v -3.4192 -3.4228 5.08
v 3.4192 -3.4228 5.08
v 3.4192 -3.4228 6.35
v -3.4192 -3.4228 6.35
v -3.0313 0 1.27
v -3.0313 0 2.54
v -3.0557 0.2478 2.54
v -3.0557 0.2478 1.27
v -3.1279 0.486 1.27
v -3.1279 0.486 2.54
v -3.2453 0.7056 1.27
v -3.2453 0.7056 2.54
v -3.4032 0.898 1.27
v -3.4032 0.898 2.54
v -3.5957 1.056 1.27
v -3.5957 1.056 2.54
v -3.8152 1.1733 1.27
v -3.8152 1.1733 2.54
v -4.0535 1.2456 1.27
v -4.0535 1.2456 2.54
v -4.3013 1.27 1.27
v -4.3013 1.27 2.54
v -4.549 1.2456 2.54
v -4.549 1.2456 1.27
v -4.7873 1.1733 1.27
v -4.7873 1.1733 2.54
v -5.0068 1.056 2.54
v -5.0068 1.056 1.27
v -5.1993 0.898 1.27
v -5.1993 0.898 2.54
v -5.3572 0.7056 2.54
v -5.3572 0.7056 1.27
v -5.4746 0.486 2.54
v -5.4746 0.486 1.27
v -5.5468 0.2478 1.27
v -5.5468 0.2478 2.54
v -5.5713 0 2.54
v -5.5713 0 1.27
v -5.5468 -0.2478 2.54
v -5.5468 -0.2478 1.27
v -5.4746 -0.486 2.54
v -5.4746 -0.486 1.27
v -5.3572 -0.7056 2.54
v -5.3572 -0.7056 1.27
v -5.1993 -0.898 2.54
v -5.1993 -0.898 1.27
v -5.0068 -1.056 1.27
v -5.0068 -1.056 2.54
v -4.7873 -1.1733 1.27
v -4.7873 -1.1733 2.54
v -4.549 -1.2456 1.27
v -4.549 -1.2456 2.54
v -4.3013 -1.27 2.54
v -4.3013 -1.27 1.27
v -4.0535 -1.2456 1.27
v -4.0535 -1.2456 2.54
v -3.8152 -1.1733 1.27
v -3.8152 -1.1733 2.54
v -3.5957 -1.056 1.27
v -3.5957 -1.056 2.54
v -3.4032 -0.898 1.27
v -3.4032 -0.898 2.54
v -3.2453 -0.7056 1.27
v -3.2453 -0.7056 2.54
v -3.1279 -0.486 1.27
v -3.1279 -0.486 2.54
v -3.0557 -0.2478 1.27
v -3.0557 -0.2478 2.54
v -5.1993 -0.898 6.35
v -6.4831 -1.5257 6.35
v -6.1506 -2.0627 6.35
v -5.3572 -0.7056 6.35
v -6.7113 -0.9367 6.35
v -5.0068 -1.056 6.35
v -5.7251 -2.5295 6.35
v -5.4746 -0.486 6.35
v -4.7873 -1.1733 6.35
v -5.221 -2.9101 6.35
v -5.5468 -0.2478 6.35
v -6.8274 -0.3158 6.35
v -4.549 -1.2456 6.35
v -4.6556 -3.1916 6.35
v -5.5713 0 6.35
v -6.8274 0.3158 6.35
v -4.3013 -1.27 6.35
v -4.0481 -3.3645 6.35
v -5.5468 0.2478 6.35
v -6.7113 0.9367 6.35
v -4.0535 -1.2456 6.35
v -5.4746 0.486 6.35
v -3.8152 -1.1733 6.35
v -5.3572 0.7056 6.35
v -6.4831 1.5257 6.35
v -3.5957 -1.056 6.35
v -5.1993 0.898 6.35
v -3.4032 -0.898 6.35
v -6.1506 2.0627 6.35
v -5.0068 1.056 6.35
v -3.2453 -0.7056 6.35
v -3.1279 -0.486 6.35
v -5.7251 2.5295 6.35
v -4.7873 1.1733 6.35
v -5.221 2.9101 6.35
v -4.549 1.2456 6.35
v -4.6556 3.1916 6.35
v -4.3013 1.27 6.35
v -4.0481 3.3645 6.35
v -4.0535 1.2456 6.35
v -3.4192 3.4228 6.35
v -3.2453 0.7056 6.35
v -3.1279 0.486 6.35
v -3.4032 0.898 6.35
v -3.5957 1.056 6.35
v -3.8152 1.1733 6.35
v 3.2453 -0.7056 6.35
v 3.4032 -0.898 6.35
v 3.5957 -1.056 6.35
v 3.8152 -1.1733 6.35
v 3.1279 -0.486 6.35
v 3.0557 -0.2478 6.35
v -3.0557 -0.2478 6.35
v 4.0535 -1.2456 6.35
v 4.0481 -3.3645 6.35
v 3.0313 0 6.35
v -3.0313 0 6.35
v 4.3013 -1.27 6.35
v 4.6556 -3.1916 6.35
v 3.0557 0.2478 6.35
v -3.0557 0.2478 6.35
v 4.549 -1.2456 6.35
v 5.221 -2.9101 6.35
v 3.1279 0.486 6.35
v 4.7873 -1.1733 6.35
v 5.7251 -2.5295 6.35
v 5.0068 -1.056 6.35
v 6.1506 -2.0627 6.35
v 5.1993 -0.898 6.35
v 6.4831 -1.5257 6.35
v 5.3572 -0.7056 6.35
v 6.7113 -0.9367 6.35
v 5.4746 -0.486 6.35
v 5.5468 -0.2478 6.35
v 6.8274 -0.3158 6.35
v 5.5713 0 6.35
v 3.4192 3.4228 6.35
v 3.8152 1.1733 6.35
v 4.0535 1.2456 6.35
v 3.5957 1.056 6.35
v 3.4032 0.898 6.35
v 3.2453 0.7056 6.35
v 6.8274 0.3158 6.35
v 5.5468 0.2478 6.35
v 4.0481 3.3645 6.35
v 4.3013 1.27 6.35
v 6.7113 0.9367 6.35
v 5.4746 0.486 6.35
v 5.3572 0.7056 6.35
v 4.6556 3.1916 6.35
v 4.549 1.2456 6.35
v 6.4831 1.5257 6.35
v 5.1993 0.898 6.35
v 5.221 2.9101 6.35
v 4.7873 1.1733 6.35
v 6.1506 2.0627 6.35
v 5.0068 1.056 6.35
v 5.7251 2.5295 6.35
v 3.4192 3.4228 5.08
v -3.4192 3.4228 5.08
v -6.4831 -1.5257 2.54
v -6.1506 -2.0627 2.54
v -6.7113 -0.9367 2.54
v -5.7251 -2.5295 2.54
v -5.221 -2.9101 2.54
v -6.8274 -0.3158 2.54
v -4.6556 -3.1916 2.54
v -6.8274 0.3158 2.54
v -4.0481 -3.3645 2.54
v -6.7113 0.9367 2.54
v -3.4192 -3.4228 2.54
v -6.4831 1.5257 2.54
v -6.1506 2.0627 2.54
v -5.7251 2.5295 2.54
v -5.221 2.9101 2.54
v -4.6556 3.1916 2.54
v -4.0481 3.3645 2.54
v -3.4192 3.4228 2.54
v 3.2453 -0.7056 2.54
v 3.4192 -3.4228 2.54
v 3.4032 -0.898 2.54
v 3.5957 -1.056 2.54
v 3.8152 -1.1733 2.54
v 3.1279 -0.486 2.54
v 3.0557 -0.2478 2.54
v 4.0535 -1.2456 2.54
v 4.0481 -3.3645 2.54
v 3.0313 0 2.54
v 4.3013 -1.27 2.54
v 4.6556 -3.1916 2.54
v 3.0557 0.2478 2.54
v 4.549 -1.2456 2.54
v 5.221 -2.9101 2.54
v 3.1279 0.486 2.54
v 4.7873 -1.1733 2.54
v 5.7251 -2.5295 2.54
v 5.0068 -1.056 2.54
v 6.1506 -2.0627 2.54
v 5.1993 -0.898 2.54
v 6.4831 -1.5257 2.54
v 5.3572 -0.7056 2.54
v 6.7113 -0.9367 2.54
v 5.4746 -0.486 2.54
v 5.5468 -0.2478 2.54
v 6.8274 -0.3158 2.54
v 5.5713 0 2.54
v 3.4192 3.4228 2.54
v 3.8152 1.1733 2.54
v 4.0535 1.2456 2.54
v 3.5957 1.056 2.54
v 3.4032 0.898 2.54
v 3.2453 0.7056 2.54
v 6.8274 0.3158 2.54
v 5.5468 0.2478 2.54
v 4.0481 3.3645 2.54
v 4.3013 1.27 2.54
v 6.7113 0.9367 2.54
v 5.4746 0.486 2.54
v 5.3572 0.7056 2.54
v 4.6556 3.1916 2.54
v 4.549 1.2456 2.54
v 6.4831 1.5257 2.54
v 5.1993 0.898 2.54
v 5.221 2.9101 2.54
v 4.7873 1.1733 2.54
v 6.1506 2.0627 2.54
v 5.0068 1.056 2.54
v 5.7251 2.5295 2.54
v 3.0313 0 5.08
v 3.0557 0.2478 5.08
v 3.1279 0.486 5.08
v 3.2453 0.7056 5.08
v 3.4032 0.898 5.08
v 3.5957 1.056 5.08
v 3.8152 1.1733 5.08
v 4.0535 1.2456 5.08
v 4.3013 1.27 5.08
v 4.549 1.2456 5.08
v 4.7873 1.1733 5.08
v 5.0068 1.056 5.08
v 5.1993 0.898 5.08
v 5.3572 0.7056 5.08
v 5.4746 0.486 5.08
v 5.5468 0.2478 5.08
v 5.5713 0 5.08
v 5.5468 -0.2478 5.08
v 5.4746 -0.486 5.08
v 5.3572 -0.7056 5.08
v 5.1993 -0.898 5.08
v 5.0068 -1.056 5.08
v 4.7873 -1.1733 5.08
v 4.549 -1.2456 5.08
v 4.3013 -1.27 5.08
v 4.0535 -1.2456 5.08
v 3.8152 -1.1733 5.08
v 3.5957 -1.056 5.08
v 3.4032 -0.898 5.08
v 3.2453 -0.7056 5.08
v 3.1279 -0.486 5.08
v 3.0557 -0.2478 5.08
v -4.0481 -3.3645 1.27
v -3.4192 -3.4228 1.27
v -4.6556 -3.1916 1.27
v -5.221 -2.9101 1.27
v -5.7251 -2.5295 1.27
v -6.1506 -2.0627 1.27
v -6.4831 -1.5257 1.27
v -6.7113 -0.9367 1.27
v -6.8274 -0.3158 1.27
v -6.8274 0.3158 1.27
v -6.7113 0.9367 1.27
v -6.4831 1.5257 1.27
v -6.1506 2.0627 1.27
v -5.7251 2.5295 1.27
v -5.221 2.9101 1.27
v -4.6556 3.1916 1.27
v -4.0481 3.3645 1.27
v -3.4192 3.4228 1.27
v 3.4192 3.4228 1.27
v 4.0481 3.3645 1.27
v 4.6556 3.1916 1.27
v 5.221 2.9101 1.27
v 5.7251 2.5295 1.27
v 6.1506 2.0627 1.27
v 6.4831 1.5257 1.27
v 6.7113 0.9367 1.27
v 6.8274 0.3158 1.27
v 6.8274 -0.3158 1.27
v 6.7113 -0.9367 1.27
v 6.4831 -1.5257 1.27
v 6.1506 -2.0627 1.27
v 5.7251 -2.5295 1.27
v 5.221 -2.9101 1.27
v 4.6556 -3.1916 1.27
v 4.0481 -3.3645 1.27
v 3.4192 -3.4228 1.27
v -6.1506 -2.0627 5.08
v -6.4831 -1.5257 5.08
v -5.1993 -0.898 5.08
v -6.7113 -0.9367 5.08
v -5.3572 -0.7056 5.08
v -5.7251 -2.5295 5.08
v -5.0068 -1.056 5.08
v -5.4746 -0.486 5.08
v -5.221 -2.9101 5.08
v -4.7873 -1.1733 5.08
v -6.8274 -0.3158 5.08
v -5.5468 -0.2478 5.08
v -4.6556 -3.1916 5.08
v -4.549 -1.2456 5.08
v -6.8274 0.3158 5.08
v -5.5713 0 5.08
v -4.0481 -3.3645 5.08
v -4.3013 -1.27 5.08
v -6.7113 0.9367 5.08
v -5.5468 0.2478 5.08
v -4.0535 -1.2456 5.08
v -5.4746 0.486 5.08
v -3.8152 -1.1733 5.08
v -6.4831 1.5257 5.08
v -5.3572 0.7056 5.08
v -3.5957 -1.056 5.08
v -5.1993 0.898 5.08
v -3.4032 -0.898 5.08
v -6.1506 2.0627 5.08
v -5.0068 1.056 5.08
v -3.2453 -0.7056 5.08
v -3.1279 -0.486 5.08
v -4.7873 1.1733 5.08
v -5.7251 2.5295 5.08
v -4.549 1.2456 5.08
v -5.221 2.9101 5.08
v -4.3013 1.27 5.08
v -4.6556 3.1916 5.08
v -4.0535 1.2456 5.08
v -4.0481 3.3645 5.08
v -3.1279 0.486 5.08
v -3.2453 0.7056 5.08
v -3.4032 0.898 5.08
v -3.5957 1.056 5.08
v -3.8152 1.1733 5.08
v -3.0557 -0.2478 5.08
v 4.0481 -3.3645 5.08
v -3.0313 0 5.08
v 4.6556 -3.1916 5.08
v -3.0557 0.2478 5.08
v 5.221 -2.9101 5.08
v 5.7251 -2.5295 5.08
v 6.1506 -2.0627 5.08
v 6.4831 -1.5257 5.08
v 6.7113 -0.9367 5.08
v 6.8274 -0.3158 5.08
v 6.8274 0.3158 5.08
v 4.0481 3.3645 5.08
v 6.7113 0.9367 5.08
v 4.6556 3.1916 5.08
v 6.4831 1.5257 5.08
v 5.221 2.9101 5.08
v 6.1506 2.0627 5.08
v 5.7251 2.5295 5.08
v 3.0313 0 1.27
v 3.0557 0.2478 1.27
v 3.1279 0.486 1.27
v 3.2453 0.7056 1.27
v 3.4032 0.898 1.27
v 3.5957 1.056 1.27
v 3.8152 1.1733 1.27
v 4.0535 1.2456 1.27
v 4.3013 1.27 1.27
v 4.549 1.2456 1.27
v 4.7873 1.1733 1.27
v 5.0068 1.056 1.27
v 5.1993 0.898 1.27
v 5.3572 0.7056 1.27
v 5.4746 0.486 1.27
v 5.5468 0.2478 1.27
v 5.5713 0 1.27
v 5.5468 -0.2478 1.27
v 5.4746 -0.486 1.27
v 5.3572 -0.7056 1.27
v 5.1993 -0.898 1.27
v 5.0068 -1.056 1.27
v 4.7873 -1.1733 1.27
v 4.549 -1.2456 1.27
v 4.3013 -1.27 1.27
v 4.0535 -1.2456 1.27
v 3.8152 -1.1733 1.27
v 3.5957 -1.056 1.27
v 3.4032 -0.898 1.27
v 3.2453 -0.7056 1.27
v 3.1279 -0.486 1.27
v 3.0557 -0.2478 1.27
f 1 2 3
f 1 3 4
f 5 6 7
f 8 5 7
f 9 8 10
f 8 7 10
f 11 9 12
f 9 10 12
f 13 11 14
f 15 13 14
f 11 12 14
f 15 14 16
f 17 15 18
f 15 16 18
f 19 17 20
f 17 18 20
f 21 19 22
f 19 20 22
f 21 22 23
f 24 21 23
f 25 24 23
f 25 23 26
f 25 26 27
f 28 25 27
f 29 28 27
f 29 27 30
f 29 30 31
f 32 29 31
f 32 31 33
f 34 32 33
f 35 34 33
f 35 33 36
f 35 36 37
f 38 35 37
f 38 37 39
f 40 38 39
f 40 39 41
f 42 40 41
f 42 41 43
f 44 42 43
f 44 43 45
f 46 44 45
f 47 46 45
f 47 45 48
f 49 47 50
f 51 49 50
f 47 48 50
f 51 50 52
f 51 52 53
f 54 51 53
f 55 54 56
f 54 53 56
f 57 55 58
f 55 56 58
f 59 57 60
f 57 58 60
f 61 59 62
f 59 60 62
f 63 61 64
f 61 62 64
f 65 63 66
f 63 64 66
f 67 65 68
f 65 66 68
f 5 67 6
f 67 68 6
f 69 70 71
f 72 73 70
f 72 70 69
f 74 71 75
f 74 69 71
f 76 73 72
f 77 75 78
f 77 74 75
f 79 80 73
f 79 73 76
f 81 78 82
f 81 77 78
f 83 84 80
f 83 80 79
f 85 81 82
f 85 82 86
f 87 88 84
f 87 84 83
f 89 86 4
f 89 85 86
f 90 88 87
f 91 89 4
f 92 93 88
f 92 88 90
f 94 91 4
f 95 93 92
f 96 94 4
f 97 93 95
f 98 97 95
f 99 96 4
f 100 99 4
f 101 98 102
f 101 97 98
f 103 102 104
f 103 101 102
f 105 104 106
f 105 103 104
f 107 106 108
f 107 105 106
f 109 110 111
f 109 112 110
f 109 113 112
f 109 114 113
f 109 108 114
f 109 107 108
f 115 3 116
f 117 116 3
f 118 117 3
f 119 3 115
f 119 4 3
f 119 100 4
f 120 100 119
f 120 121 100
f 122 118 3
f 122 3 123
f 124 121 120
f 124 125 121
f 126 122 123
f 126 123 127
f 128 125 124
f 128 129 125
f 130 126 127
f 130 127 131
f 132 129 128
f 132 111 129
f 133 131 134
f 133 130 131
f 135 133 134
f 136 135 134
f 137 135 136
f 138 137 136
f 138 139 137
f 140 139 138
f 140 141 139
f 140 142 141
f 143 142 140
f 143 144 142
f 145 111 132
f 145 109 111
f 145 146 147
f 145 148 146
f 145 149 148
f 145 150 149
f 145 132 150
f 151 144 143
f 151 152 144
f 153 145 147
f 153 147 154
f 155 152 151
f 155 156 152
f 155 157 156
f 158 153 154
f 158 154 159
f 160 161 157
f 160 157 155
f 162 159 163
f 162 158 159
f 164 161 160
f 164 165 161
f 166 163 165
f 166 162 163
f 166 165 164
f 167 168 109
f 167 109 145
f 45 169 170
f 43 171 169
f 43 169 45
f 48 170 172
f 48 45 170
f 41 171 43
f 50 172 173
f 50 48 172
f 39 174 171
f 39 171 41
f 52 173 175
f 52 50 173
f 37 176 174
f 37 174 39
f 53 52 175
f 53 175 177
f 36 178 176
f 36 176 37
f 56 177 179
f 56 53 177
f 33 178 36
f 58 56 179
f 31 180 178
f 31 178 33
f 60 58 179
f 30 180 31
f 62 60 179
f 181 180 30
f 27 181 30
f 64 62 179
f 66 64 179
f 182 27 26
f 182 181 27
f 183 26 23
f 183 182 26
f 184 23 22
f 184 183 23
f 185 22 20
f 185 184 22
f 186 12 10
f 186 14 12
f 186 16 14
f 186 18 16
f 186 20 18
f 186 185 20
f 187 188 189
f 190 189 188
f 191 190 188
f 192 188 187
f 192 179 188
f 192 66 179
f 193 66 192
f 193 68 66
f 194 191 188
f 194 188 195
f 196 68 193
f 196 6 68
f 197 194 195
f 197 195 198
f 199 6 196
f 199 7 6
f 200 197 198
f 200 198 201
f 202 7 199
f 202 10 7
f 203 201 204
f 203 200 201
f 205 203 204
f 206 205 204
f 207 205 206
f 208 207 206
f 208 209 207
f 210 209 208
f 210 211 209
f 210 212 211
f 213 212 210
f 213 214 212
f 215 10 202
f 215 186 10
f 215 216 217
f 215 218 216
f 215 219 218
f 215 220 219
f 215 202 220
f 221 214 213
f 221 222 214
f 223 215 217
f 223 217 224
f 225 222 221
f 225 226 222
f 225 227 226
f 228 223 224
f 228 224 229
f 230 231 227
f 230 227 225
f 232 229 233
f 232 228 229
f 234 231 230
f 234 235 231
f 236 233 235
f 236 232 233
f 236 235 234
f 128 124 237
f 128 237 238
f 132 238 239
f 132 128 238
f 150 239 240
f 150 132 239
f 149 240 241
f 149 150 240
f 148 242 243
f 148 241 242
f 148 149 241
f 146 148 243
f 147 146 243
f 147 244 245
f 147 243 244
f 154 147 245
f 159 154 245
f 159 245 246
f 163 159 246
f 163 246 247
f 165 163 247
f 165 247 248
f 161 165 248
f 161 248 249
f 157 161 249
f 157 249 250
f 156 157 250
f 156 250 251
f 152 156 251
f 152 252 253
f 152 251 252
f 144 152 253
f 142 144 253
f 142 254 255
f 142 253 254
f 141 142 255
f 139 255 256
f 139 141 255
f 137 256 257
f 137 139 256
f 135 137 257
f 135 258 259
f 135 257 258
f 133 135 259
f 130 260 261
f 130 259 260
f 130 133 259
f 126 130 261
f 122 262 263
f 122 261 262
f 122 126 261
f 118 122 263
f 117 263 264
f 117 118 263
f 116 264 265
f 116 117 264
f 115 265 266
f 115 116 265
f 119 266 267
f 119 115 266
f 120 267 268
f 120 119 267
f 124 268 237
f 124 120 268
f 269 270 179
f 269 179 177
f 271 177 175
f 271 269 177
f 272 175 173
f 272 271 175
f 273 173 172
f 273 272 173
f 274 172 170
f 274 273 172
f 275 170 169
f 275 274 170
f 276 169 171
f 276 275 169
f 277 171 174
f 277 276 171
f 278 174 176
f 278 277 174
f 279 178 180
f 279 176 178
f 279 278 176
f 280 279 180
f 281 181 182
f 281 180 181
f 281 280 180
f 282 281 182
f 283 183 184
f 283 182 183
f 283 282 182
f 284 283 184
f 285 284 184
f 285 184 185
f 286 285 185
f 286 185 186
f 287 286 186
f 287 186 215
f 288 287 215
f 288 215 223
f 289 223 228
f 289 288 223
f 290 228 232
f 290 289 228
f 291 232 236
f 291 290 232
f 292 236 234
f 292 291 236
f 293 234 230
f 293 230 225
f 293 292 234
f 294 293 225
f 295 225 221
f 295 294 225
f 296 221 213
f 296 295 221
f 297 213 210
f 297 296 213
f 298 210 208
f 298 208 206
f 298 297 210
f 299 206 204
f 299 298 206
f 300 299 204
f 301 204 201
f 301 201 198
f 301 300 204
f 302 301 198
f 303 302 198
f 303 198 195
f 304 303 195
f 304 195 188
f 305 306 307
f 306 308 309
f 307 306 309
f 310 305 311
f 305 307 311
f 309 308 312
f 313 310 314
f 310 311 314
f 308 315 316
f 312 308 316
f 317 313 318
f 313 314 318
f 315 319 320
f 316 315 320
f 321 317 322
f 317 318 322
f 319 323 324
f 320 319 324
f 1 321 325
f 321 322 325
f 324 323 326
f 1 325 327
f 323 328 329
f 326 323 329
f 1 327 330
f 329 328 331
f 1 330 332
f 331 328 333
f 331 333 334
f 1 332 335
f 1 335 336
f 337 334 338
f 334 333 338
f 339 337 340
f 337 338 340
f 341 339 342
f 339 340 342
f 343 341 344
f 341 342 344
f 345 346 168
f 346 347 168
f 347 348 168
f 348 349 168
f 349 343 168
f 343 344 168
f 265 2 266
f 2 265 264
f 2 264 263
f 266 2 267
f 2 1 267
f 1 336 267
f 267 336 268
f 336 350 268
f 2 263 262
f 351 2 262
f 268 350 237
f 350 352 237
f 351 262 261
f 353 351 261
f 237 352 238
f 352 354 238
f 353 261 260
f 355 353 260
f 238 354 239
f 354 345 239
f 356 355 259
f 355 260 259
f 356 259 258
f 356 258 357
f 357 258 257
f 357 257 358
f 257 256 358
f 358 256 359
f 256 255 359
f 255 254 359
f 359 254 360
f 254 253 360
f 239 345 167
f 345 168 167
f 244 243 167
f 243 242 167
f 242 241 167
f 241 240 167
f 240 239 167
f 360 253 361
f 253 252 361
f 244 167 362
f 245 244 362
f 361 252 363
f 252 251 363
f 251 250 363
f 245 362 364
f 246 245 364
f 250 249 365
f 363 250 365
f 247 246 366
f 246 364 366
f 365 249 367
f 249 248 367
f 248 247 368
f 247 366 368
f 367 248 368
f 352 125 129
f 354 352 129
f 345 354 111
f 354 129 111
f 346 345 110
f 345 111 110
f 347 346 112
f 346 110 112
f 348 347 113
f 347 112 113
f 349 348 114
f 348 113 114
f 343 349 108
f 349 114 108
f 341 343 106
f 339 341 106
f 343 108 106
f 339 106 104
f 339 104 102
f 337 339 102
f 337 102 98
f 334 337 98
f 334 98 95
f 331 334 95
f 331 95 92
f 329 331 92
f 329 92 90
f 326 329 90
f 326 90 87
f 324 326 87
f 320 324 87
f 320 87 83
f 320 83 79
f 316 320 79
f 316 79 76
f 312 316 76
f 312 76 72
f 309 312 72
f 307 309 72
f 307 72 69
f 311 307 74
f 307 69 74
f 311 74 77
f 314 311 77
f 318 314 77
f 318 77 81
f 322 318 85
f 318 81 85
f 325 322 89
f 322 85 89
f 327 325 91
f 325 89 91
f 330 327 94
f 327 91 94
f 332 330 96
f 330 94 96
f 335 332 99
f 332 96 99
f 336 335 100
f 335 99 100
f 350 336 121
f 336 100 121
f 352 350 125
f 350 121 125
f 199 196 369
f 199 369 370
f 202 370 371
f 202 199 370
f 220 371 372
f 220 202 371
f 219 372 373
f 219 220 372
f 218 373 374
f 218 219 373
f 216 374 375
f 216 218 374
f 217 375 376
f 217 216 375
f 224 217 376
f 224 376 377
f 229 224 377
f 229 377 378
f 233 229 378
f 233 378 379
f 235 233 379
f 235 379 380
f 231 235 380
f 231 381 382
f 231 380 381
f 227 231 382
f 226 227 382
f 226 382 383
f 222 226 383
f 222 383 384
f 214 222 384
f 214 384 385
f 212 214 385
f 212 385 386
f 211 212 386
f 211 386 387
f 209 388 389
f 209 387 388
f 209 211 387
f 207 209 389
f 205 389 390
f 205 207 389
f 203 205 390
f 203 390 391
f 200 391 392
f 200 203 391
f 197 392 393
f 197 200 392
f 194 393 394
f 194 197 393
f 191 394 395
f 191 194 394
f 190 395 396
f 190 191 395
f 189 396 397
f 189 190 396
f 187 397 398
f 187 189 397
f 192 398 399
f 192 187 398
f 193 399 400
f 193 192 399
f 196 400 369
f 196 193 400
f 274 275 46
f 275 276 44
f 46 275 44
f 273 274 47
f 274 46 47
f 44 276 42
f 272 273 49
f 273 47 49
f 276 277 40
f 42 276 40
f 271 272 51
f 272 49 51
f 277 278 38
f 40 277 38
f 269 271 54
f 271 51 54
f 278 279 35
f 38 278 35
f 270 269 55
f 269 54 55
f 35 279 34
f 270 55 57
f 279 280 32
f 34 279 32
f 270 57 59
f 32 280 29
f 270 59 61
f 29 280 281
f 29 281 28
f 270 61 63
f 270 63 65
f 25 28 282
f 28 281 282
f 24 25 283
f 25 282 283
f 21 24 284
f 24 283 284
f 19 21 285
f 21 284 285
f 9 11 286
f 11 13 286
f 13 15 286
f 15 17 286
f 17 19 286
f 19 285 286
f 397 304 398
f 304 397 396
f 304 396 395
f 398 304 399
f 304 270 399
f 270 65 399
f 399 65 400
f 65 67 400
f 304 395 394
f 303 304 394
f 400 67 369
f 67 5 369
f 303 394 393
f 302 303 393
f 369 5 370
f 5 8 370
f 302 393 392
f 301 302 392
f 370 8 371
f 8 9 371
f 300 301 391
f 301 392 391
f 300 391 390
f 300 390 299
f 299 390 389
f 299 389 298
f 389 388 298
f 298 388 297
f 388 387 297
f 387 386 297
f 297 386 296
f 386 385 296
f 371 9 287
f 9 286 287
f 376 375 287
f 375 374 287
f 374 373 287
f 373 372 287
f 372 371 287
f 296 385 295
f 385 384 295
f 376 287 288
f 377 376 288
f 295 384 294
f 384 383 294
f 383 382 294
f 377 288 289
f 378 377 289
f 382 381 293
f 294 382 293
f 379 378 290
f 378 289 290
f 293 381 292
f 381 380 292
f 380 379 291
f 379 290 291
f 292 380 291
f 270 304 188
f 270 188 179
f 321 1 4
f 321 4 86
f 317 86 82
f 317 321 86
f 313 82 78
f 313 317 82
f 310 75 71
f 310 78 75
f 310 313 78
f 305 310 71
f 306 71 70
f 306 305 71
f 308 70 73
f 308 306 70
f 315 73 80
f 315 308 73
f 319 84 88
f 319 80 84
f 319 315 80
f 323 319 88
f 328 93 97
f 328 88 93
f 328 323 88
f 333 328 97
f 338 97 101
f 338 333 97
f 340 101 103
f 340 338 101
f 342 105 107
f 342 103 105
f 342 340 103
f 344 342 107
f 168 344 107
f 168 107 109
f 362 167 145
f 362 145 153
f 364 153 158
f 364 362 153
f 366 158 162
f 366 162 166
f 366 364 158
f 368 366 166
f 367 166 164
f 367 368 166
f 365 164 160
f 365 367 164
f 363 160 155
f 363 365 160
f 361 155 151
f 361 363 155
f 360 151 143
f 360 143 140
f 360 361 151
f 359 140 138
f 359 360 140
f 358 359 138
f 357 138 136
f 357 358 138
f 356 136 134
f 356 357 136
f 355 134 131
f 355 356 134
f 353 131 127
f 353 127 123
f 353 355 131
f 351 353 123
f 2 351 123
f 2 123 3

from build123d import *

# Parameters (mm, degrees)
BOSS_EXTRUDE1_DEPTH = 7.62
SKETCH5_W           = 13.683909726
SKETCH5_H           = 1.27
CUT_EXTRUDE5_DEPTH  = 13.318197616
SKETCH3_R           = 1.27
CUT_EXTRUDE6_DEPTH  = 11.797780229
SKETCH6_W           = 13.683909726
SKETCH6_H           = 1.27
CUT_EXTRUDE8_DEPTH  = 12.575668123
SKETCH7_W           = 13.683909726
SKETCH7_H           = 2.54
CUT_EXTRUDE9_DEPTH  = 12.575668123


with BuildPart() as part:
    # Sketch1 → Boss-Extrude1 (new body)
    with BuildSketch(Plane.XY):
        with BuildLine():
            Line((-3.419191134, 3.422763728), (3.419191134, 3.422763728))
            ThreePointArc((3.419191134, 3.422763728), (6.841954863, 0), (3.419191134, -3.422763728))
            Line((3.419191134, -3.422763728), (-3.419191134, -3.422763728))
            ThreePointArc((-3.419191134, -3.422763728), (-6.841954863, 0), (-3.419191134, 3.422763728))
        make_face()
    extrude(amount=BOSS_EXTRUDE1_DEPTH)

    # Sketch5 → Cut-Extrude5 (cut, through all)
    with BuildSketch(Plane(origin=(0, 3.422763728, 0), x_dir=(1, 0, 0), z_dir=(0, 1, 0))):
        with Locations((0, -6.985)):
            Rectangle(SKETCH5_W, SKETCH5_H)
    extrude(amount=-CUT_EXTRUDE5_DEPTH, mode=Mode.SUBTRACT)

    # Sketch3 → Cut-Extrude6 (cut, through all)
    with BuildSketch(Plane.XY.offset(7.62)):
        with Locations((-4.301250903, 0)):
            Circle(SKETCH3_R)
    cut_extrude6 = extrude(amount=-CUT_EXTRUDE6_DEPTH, mode=Mode.SUBTRACT)

    # Mirror2: Cut-Extrude6 across plane
    add(cut_extrude6.mirror(Plane(origin=(0, 0, 0), x_dir=(0, 0, 1), z_dir=(1, 0, 0))), mode=Mode.SUBTRACT)

    # Sketch6 → Cut-Extrude8 (cut, through all)
    with BuildSketch(Plane(origin=(0, 3.422763728, 0), x_dir=(1, 0, 0), z_dir=(0, 1, 0))):
        with Locations((0, -0.635)):
            Rectangle(SKETCH6_W, SKETCH6_H)
    extrude(amount=-CUT_EXTRUDE8_DEPTH, mode=Mode.SUBTRACT)

    # Sketch7 → Cut-Extrude9 (cut, through all)
    with BuildSketch(Plane(origin=(0, 3.422763728, 0), x_dir=(1, 0, 0), z_dir=(0, 1, 0))):
        with Locations((0, -3.81)):
            Rectangle(SKETCH7_W, SKETCH7_H)
    extrude(amount=-CUT_EXTRUDE9_DEPTH, mode=Mode.SUBTRACT)


with BuildPart() as cut_extrude9_piece_1:
    # of the separate pieces the step leaves, piece 1, a body of its own (cut_extrude9_pieces)
    add(part.part.solids().sort_by_distance((3.419191134, 3.422763728, 5.08))[0])


with BuildPart() as cut_extrude9_piece_2:
    # of the separate pieces the step leaves, piece 2, a body of its own (cut_extrude9_pieces)
    add(part.part.solids().sort_by_distance((3.419191134, 3.422763728, 1.27))[0])


solid = Compound([cut_extrude9_piece_1.part, cut_extrude9_piece_2.part])
